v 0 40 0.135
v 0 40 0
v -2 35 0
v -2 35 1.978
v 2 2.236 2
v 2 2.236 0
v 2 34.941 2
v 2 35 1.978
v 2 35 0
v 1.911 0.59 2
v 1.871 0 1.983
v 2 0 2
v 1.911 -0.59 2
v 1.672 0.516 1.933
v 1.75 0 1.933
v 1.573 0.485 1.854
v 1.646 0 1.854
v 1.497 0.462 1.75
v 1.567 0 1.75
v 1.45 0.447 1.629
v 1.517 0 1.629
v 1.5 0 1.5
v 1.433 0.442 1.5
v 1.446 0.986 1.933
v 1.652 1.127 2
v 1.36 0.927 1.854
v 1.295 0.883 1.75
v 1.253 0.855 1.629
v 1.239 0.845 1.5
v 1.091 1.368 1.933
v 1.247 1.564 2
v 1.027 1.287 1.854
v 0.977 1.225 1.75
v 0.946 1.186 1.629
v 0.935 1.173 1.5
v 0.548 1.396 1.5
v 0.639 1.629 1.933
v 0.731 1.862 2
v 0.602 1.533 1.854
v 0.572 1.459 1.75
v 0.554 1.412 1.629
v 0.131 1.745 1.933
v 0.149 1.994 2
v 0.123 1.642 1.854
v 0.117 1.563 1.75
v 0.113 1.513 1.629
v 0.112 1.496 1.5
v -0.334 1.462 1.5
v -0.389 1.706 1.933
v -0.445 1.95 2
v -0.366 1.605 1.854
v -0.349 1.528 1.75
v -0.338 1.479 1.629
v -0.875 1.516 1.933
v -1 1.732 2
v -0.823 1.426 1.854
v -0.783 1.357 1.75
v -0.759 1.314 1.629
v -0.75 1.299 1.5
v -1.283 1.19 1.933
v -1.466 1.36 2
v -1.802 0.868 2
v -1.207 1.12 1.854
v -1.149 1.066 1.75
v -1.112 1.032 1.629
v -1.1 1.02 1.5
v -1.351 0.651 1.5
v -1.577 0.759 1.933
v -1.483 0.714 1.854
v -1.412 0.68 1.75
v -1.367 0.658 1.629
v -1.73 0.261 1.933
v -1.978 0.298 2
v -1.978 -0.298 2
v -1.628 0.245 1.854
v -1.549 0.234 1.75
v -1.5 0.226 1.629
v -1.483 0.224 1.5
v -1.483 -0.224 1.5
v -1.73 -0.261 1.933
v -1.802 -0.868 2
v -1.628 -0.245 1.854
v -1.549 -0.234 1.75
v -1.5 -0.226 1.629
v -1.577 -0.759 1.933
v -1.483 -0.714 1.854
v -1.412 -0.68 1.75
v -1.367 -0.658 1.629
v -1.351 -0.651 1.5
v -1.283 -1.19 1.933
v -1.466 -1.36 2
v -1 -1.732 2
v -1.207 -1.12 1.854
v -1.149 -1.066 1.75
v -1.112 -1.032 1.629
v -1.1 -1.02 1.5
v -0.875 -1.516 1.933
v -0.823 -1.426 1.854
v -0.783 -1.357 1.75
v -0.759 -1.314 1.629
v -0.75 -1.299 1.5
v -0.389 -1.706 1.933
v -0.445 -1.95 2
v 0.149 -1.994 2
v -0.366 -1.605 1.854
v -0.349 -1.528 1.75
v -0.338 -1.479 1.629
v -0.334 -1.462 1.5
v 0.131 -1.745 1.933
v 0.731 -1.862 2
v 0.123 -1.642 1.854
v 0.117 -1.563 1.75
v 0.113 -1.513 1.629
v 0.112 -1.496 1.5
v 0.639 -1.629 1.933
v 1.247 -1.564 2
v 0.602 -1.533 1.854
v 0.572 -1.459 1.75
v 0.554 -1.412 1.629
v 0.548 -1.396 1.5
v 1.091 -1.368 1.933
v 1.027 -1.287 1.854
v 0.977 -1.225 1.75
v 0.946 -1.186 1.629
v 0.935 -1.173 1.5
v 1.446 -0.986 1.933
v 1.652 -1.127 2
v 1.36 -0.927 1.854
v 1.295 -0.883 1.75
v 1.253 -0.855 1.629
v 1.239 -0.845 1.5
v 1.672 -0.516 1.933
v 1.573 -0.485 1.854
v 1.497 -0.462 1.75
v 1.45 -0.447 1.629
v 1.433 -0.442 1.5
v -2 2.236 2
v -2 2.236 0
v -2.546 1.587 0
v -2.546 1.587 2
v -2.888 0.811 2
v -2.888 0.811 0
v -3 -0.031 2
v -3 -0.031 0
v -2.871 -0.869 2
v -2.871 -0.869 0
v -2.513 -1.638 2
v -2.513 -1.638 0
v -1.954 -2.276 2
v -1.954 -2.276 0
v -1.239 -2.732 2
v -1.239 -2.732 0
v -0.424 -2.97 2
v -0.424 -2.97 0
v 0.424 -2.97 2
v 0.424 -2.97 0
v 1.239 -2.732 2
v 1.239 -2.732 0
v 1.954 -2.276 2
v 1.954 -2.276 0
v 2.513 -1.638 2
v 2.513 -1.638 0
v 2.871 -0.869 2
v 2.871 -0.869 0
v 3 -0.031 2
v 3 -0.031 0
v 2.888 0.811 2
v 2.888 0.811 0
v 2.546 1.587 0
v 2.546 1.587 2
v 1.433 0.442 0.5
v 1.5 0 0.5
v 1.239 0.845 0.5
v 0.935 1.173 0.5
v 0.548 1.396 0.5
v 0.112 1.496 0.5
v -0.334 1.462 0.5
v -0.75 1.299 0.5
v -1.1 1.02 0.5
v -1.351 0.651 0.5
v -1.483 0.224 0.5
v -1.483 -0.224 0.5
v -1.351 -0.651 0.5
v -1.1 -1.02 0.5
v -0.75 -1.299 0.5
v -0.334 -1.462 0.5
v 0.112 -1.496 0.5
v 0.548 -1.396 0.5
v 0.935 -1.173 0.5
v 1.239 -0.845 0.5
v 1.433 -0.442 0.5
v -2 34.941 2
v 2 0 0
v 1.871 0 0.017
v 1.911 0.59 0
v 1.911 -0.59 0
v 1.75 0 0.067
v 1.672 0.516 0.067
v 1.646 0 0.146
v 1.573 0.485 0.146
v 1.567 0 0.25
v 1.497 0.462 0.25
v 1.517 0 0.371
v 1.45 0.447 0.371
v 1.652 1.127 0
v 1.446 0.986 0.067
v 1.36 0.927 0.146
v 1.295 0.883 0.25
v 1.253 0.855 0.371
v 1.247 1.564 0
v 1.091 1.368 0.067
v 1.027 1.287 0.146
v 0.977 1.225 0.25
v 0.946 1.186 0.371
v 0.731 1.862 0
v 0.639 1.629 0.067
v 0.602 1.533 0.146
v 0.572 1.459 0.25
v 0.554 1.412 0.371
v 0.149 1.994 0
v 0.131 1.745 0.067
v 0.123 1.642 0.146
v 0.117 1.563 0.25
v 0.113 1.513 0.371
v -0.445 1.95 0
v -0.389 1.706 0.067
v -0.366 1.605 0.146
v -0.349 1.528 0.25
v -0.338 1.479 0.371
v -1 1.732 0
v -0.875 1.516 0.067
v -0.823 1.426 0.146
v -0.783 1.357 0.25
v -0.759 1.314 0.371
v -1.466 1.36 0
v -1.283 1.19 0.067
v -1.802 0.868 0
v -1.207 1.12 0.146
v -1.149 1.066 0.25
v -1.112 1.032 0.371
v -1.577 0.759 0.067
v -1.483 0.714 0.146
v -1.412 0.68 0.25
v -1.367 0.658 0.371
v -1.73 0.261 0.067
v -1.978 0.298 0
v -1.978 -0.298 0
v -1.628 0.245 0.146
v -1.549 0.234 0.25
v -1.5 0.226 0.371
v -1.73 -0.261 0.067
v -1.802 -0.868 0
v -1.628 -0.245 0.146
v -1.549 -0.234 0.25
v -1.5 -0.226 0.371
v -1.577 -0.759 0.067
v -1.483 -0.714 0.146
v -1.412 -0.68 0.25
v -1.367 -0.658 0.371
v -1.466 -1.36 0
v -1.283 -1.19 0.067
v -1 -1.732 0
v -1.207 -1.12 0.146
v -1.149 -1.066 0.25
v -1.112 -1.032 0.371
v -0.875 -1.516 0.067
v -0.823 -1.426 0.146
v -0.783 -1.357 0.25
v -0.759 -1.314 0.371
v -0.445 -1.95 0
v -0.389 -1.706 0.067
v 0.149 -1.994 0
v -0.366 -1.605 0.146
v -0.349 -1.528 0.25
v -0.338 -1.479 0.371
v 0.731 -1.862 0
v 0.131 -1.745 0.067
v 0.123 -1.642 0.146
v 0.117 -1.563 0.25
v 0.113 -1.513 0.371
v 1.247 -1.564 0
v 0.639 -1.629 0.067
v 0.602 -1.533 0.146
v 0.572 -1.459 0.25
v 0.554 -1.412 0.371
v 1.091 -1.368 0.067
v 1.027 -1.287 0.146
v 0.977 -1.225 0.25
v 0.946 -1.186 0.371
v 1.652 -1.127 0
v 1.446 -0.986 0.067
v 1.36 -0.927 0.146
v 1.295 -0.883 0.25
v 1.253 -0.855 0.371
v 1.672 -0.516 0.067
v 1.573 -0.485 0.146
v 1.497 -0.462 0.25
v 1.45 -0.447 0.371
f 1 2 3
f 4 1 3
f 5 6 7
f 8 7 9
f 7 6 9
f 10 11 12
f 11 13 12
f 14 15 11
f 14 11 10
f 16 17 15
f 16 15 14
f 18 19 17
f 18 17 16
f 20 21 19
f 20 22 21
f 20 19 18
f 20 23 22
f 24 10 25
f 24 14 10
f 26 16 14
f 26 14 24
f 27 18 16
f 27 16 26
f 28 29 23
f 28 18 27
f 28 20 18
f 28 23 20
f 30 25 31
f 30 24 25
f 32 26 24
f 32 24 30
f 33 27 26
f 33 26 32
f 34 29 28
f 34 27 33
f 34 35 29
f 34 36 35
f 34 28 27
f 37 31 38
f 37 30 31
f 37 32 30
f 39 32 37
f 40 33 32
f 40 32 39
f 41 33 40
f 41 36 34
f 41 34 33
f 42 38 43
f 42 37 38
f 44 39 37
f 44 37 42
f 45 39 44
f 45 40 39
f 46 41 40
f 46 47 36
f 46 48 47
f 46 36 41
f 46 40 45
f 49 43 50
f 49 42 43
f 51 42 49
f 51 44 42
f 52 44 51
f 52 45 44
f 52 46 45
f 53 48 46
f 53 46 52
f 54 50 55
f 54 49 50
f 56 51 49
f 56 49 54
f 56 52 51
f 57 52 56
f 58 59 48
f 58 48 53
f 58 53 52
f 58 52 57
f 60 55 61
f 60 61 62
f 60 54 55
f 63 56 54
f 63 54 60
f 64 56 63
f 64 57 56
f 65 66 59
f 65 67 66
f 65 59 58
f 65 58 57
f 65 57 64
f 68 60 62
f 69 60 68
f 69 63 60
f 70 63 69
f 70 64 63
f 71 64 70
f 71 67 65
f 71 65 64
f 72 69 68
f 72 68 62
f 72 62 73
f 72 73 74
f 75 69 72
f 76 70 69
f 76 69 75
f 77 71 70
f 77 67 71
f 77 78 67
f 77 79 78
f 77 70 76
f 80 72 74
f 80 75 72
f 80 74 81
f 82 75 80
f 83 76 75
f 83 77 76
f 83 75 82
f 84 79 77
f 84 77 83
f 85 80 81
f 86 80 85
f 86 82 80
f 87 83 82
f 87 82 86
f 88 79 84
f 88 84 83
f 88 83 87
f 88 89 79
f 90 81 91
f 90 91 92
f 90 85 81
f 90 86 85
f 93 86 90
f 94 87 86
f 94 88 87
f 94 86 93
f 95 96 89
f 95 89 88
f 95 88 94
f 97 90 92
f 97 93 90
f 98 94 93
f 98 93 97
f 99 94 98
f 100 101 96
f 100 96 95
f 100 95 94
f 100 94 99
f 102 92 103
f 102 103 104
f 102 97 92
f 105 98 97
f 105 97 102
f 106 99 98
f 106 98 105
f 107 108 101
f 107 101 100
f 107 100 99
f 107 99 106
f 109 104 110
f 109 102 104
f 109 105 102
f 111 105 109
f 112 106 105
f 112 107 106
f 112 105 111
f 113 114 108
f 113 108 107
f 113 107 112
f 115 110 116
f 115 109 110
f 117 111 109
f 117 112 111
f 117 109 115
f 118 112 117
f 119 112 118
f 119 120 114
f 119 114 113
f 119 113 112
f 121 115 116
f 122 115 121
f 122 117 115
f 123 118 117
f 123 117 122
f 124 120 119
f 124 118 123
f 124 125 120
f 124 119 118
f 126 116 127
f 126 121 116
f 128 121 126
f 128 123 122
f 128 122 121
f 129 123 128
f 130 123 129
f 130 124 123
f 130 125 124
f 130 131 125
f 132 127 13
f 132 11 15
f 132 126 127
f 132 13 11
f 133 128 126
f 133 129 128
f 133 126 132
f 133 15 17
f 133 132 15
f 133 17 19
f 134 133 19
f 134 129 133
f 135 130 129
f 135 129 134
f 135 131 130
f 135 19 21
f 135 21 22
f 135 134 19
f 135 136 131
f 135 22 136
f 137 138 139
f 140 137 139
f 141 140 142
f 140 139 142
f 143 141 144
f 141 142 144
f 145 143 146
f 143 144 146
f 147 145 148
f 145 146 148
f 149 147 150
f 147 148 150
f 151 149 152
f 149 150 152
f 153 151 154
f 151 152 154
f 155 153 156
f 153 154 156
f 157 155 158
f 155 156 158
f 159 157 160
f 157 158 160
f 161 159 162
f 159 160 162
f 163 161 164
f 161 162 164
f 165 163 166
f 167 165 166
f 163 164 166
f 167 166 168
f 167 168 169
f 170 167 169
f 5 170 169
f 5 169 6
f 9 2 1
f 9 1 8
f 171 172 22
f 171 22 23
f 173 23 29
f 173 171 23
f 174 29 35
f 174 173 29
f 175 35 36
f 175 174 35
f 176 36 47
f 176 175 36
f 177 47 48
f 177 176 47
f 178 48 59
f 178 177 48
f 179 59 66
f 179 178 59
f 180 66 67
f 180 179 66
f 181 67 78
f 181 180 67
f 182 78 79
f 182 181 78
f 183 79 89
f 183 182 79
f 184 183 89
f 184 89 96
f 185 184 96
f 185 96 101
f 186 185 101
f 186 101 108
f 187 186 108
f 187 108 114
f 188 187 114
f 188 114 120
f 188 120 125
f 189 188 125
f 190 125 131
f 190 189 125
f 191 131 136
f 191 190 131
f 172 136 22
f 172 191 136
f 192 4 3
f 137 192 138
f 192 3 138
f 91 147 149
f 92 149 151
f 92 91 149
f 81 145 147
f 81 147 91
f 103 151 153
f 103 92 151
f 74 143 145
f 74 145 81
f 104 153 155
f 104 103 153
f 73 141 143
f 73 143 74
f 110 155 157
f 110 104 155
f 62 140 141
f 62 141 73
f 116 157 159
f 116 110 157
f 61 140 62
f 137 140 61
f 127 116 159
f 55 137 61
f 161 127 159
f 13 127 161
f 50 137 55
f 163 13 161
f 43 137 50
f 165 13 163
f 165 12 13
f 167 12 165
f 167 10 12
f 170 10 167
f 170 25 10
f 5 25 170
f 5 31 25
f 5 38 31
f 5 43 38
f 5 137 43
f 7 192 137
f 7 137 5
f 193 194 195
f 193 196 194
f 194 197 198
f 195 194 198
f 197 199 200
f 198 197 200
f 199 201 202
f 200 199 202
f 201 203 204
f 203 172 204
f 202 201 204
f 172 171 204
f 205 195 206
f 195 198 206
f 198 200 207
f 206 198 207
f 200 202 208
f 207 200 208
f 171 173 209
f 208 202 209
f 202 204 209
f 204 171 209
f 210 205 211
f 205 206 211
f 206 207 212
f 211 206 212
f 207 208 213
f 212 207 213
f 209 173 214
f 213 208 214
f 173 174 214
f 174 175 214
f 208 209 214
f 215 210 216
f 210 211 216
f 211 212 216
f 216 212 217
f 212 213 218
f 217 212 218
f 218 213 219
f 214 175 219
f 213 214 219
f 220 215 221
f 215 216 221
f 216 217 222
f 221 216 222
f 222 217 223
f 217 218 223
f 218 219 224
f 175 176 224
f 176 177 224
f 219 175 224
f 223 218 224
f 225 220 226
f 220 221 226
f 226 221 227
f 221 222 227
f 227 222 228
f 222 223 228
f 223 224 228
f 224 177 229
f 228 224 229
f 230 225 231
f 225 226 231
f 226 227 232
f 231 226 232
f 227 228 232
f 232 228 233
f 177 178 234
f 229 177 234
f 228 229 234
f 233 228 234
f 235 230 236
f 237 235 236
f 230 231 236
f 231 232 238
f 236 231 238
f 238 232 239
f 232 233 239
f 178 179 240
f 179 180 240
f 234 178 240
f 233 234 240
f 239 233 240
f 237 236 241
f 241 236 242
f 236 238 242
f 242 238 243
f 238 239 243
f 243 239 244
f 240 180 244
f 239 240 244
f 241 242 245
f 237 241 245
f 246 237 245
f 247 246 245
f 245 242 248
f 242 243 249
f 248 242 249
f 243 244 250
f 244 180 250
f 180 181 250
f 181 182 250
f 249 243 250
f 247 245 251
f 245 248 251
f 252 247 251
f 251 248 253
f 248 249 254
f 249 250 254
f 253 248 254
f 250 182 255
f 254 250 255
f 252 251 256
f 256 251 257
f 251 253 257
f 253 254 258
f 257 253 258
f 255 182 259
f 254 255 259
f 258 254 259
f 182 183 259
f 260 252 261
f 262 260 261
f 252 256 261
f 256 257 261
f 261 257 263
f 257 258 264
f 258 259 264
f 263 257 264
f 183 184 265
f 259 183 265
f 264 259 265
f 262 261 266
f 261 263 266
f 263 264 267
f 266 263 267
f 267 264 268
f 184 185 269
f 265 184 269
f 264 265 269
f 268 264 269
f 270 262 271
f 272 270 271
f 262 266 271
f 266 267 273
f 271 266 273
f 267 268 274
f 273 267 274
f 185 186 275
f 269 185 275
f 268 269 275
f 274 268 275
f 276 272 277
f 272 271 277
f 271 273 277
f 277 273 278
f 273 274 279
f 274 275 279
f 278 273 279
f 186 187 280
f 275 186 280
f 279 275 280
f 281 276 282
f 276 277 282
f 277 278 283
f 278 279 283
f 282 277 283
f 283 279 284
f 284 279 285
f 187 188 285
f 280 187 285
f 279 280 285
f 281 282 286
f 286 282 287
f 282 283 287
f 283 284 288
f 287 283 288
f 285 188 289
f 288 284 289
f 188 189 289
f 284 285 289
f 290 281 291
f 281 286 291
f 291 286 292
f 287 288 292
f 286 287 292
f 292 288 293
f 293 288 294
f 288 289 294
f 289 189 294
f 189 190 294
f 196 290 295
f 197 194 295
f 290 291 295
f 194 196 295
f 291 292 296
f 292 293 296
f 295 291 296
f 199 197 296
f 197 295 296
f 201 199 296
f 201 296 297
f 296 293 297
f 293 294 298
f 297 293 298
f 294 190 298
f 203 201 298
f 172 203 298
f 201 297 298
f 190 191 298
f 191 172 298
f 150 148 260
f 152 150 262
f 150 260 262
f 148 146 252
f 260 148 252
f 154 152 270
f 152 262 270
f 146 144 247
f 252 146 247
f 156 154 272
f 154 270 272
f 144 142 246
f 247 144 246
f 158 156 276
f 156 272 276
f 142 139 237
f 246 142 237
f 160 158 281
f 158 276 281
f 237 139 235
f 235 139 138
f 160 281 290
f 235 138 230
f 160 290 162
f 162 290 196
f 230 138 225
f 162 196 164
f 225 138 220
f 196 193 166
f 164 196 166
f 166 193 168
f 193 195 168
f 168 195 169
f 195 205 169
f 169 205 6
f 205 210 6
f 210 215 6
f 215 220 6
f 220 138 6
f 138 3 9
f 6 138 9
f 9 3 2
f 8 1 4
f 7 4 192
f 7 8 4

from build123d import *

# Parameters (mm, degrees)
SKETCH_R     = 1.5
PAD_DEPTH    = 2
POCKET_DEPTH = 2.5
FILLET_R     = 0.5


with BuildPart() as part:
    # Sketch → Pad (new body)
    with BuildSketch(Plane.XY):
        with BuildLine():
            ThreePointArc((-2, 2.236068), (0, -3), (2, 2.236068))
            Line((2, 2.236068), (2, 35))
            Line((0, 40), (2, 35))
            Line((0, 40), (-2, 35))
            Line((-2, 35), (-2, 2.236068))
        make_face()
        Circle(SKETCH_R, mode=Mode.SUBTRACT)
    extrude(amount=PAD_DEPTH)

    # Sketch001 → Pocket (cut, symmetric)
    with BuildSketch(Plane.YZ):
        Polygon((40.364792, 0), (32.17564, 3.019657), (42.446777, 4.153183), align=None)
    extrude(amount=POCKET_DEPTH, both=True, mode=Mode.SUBTRACT)

    # Fillet
    fillet_edges = [part.edges().sort_by_distance(p)[0] for p in [
        (-1.5, 0, 2),
        (-1.5, 0, 0),
    ]]
    fillet(fillet_edges, radius=FILLET_R)


solid = part.part
